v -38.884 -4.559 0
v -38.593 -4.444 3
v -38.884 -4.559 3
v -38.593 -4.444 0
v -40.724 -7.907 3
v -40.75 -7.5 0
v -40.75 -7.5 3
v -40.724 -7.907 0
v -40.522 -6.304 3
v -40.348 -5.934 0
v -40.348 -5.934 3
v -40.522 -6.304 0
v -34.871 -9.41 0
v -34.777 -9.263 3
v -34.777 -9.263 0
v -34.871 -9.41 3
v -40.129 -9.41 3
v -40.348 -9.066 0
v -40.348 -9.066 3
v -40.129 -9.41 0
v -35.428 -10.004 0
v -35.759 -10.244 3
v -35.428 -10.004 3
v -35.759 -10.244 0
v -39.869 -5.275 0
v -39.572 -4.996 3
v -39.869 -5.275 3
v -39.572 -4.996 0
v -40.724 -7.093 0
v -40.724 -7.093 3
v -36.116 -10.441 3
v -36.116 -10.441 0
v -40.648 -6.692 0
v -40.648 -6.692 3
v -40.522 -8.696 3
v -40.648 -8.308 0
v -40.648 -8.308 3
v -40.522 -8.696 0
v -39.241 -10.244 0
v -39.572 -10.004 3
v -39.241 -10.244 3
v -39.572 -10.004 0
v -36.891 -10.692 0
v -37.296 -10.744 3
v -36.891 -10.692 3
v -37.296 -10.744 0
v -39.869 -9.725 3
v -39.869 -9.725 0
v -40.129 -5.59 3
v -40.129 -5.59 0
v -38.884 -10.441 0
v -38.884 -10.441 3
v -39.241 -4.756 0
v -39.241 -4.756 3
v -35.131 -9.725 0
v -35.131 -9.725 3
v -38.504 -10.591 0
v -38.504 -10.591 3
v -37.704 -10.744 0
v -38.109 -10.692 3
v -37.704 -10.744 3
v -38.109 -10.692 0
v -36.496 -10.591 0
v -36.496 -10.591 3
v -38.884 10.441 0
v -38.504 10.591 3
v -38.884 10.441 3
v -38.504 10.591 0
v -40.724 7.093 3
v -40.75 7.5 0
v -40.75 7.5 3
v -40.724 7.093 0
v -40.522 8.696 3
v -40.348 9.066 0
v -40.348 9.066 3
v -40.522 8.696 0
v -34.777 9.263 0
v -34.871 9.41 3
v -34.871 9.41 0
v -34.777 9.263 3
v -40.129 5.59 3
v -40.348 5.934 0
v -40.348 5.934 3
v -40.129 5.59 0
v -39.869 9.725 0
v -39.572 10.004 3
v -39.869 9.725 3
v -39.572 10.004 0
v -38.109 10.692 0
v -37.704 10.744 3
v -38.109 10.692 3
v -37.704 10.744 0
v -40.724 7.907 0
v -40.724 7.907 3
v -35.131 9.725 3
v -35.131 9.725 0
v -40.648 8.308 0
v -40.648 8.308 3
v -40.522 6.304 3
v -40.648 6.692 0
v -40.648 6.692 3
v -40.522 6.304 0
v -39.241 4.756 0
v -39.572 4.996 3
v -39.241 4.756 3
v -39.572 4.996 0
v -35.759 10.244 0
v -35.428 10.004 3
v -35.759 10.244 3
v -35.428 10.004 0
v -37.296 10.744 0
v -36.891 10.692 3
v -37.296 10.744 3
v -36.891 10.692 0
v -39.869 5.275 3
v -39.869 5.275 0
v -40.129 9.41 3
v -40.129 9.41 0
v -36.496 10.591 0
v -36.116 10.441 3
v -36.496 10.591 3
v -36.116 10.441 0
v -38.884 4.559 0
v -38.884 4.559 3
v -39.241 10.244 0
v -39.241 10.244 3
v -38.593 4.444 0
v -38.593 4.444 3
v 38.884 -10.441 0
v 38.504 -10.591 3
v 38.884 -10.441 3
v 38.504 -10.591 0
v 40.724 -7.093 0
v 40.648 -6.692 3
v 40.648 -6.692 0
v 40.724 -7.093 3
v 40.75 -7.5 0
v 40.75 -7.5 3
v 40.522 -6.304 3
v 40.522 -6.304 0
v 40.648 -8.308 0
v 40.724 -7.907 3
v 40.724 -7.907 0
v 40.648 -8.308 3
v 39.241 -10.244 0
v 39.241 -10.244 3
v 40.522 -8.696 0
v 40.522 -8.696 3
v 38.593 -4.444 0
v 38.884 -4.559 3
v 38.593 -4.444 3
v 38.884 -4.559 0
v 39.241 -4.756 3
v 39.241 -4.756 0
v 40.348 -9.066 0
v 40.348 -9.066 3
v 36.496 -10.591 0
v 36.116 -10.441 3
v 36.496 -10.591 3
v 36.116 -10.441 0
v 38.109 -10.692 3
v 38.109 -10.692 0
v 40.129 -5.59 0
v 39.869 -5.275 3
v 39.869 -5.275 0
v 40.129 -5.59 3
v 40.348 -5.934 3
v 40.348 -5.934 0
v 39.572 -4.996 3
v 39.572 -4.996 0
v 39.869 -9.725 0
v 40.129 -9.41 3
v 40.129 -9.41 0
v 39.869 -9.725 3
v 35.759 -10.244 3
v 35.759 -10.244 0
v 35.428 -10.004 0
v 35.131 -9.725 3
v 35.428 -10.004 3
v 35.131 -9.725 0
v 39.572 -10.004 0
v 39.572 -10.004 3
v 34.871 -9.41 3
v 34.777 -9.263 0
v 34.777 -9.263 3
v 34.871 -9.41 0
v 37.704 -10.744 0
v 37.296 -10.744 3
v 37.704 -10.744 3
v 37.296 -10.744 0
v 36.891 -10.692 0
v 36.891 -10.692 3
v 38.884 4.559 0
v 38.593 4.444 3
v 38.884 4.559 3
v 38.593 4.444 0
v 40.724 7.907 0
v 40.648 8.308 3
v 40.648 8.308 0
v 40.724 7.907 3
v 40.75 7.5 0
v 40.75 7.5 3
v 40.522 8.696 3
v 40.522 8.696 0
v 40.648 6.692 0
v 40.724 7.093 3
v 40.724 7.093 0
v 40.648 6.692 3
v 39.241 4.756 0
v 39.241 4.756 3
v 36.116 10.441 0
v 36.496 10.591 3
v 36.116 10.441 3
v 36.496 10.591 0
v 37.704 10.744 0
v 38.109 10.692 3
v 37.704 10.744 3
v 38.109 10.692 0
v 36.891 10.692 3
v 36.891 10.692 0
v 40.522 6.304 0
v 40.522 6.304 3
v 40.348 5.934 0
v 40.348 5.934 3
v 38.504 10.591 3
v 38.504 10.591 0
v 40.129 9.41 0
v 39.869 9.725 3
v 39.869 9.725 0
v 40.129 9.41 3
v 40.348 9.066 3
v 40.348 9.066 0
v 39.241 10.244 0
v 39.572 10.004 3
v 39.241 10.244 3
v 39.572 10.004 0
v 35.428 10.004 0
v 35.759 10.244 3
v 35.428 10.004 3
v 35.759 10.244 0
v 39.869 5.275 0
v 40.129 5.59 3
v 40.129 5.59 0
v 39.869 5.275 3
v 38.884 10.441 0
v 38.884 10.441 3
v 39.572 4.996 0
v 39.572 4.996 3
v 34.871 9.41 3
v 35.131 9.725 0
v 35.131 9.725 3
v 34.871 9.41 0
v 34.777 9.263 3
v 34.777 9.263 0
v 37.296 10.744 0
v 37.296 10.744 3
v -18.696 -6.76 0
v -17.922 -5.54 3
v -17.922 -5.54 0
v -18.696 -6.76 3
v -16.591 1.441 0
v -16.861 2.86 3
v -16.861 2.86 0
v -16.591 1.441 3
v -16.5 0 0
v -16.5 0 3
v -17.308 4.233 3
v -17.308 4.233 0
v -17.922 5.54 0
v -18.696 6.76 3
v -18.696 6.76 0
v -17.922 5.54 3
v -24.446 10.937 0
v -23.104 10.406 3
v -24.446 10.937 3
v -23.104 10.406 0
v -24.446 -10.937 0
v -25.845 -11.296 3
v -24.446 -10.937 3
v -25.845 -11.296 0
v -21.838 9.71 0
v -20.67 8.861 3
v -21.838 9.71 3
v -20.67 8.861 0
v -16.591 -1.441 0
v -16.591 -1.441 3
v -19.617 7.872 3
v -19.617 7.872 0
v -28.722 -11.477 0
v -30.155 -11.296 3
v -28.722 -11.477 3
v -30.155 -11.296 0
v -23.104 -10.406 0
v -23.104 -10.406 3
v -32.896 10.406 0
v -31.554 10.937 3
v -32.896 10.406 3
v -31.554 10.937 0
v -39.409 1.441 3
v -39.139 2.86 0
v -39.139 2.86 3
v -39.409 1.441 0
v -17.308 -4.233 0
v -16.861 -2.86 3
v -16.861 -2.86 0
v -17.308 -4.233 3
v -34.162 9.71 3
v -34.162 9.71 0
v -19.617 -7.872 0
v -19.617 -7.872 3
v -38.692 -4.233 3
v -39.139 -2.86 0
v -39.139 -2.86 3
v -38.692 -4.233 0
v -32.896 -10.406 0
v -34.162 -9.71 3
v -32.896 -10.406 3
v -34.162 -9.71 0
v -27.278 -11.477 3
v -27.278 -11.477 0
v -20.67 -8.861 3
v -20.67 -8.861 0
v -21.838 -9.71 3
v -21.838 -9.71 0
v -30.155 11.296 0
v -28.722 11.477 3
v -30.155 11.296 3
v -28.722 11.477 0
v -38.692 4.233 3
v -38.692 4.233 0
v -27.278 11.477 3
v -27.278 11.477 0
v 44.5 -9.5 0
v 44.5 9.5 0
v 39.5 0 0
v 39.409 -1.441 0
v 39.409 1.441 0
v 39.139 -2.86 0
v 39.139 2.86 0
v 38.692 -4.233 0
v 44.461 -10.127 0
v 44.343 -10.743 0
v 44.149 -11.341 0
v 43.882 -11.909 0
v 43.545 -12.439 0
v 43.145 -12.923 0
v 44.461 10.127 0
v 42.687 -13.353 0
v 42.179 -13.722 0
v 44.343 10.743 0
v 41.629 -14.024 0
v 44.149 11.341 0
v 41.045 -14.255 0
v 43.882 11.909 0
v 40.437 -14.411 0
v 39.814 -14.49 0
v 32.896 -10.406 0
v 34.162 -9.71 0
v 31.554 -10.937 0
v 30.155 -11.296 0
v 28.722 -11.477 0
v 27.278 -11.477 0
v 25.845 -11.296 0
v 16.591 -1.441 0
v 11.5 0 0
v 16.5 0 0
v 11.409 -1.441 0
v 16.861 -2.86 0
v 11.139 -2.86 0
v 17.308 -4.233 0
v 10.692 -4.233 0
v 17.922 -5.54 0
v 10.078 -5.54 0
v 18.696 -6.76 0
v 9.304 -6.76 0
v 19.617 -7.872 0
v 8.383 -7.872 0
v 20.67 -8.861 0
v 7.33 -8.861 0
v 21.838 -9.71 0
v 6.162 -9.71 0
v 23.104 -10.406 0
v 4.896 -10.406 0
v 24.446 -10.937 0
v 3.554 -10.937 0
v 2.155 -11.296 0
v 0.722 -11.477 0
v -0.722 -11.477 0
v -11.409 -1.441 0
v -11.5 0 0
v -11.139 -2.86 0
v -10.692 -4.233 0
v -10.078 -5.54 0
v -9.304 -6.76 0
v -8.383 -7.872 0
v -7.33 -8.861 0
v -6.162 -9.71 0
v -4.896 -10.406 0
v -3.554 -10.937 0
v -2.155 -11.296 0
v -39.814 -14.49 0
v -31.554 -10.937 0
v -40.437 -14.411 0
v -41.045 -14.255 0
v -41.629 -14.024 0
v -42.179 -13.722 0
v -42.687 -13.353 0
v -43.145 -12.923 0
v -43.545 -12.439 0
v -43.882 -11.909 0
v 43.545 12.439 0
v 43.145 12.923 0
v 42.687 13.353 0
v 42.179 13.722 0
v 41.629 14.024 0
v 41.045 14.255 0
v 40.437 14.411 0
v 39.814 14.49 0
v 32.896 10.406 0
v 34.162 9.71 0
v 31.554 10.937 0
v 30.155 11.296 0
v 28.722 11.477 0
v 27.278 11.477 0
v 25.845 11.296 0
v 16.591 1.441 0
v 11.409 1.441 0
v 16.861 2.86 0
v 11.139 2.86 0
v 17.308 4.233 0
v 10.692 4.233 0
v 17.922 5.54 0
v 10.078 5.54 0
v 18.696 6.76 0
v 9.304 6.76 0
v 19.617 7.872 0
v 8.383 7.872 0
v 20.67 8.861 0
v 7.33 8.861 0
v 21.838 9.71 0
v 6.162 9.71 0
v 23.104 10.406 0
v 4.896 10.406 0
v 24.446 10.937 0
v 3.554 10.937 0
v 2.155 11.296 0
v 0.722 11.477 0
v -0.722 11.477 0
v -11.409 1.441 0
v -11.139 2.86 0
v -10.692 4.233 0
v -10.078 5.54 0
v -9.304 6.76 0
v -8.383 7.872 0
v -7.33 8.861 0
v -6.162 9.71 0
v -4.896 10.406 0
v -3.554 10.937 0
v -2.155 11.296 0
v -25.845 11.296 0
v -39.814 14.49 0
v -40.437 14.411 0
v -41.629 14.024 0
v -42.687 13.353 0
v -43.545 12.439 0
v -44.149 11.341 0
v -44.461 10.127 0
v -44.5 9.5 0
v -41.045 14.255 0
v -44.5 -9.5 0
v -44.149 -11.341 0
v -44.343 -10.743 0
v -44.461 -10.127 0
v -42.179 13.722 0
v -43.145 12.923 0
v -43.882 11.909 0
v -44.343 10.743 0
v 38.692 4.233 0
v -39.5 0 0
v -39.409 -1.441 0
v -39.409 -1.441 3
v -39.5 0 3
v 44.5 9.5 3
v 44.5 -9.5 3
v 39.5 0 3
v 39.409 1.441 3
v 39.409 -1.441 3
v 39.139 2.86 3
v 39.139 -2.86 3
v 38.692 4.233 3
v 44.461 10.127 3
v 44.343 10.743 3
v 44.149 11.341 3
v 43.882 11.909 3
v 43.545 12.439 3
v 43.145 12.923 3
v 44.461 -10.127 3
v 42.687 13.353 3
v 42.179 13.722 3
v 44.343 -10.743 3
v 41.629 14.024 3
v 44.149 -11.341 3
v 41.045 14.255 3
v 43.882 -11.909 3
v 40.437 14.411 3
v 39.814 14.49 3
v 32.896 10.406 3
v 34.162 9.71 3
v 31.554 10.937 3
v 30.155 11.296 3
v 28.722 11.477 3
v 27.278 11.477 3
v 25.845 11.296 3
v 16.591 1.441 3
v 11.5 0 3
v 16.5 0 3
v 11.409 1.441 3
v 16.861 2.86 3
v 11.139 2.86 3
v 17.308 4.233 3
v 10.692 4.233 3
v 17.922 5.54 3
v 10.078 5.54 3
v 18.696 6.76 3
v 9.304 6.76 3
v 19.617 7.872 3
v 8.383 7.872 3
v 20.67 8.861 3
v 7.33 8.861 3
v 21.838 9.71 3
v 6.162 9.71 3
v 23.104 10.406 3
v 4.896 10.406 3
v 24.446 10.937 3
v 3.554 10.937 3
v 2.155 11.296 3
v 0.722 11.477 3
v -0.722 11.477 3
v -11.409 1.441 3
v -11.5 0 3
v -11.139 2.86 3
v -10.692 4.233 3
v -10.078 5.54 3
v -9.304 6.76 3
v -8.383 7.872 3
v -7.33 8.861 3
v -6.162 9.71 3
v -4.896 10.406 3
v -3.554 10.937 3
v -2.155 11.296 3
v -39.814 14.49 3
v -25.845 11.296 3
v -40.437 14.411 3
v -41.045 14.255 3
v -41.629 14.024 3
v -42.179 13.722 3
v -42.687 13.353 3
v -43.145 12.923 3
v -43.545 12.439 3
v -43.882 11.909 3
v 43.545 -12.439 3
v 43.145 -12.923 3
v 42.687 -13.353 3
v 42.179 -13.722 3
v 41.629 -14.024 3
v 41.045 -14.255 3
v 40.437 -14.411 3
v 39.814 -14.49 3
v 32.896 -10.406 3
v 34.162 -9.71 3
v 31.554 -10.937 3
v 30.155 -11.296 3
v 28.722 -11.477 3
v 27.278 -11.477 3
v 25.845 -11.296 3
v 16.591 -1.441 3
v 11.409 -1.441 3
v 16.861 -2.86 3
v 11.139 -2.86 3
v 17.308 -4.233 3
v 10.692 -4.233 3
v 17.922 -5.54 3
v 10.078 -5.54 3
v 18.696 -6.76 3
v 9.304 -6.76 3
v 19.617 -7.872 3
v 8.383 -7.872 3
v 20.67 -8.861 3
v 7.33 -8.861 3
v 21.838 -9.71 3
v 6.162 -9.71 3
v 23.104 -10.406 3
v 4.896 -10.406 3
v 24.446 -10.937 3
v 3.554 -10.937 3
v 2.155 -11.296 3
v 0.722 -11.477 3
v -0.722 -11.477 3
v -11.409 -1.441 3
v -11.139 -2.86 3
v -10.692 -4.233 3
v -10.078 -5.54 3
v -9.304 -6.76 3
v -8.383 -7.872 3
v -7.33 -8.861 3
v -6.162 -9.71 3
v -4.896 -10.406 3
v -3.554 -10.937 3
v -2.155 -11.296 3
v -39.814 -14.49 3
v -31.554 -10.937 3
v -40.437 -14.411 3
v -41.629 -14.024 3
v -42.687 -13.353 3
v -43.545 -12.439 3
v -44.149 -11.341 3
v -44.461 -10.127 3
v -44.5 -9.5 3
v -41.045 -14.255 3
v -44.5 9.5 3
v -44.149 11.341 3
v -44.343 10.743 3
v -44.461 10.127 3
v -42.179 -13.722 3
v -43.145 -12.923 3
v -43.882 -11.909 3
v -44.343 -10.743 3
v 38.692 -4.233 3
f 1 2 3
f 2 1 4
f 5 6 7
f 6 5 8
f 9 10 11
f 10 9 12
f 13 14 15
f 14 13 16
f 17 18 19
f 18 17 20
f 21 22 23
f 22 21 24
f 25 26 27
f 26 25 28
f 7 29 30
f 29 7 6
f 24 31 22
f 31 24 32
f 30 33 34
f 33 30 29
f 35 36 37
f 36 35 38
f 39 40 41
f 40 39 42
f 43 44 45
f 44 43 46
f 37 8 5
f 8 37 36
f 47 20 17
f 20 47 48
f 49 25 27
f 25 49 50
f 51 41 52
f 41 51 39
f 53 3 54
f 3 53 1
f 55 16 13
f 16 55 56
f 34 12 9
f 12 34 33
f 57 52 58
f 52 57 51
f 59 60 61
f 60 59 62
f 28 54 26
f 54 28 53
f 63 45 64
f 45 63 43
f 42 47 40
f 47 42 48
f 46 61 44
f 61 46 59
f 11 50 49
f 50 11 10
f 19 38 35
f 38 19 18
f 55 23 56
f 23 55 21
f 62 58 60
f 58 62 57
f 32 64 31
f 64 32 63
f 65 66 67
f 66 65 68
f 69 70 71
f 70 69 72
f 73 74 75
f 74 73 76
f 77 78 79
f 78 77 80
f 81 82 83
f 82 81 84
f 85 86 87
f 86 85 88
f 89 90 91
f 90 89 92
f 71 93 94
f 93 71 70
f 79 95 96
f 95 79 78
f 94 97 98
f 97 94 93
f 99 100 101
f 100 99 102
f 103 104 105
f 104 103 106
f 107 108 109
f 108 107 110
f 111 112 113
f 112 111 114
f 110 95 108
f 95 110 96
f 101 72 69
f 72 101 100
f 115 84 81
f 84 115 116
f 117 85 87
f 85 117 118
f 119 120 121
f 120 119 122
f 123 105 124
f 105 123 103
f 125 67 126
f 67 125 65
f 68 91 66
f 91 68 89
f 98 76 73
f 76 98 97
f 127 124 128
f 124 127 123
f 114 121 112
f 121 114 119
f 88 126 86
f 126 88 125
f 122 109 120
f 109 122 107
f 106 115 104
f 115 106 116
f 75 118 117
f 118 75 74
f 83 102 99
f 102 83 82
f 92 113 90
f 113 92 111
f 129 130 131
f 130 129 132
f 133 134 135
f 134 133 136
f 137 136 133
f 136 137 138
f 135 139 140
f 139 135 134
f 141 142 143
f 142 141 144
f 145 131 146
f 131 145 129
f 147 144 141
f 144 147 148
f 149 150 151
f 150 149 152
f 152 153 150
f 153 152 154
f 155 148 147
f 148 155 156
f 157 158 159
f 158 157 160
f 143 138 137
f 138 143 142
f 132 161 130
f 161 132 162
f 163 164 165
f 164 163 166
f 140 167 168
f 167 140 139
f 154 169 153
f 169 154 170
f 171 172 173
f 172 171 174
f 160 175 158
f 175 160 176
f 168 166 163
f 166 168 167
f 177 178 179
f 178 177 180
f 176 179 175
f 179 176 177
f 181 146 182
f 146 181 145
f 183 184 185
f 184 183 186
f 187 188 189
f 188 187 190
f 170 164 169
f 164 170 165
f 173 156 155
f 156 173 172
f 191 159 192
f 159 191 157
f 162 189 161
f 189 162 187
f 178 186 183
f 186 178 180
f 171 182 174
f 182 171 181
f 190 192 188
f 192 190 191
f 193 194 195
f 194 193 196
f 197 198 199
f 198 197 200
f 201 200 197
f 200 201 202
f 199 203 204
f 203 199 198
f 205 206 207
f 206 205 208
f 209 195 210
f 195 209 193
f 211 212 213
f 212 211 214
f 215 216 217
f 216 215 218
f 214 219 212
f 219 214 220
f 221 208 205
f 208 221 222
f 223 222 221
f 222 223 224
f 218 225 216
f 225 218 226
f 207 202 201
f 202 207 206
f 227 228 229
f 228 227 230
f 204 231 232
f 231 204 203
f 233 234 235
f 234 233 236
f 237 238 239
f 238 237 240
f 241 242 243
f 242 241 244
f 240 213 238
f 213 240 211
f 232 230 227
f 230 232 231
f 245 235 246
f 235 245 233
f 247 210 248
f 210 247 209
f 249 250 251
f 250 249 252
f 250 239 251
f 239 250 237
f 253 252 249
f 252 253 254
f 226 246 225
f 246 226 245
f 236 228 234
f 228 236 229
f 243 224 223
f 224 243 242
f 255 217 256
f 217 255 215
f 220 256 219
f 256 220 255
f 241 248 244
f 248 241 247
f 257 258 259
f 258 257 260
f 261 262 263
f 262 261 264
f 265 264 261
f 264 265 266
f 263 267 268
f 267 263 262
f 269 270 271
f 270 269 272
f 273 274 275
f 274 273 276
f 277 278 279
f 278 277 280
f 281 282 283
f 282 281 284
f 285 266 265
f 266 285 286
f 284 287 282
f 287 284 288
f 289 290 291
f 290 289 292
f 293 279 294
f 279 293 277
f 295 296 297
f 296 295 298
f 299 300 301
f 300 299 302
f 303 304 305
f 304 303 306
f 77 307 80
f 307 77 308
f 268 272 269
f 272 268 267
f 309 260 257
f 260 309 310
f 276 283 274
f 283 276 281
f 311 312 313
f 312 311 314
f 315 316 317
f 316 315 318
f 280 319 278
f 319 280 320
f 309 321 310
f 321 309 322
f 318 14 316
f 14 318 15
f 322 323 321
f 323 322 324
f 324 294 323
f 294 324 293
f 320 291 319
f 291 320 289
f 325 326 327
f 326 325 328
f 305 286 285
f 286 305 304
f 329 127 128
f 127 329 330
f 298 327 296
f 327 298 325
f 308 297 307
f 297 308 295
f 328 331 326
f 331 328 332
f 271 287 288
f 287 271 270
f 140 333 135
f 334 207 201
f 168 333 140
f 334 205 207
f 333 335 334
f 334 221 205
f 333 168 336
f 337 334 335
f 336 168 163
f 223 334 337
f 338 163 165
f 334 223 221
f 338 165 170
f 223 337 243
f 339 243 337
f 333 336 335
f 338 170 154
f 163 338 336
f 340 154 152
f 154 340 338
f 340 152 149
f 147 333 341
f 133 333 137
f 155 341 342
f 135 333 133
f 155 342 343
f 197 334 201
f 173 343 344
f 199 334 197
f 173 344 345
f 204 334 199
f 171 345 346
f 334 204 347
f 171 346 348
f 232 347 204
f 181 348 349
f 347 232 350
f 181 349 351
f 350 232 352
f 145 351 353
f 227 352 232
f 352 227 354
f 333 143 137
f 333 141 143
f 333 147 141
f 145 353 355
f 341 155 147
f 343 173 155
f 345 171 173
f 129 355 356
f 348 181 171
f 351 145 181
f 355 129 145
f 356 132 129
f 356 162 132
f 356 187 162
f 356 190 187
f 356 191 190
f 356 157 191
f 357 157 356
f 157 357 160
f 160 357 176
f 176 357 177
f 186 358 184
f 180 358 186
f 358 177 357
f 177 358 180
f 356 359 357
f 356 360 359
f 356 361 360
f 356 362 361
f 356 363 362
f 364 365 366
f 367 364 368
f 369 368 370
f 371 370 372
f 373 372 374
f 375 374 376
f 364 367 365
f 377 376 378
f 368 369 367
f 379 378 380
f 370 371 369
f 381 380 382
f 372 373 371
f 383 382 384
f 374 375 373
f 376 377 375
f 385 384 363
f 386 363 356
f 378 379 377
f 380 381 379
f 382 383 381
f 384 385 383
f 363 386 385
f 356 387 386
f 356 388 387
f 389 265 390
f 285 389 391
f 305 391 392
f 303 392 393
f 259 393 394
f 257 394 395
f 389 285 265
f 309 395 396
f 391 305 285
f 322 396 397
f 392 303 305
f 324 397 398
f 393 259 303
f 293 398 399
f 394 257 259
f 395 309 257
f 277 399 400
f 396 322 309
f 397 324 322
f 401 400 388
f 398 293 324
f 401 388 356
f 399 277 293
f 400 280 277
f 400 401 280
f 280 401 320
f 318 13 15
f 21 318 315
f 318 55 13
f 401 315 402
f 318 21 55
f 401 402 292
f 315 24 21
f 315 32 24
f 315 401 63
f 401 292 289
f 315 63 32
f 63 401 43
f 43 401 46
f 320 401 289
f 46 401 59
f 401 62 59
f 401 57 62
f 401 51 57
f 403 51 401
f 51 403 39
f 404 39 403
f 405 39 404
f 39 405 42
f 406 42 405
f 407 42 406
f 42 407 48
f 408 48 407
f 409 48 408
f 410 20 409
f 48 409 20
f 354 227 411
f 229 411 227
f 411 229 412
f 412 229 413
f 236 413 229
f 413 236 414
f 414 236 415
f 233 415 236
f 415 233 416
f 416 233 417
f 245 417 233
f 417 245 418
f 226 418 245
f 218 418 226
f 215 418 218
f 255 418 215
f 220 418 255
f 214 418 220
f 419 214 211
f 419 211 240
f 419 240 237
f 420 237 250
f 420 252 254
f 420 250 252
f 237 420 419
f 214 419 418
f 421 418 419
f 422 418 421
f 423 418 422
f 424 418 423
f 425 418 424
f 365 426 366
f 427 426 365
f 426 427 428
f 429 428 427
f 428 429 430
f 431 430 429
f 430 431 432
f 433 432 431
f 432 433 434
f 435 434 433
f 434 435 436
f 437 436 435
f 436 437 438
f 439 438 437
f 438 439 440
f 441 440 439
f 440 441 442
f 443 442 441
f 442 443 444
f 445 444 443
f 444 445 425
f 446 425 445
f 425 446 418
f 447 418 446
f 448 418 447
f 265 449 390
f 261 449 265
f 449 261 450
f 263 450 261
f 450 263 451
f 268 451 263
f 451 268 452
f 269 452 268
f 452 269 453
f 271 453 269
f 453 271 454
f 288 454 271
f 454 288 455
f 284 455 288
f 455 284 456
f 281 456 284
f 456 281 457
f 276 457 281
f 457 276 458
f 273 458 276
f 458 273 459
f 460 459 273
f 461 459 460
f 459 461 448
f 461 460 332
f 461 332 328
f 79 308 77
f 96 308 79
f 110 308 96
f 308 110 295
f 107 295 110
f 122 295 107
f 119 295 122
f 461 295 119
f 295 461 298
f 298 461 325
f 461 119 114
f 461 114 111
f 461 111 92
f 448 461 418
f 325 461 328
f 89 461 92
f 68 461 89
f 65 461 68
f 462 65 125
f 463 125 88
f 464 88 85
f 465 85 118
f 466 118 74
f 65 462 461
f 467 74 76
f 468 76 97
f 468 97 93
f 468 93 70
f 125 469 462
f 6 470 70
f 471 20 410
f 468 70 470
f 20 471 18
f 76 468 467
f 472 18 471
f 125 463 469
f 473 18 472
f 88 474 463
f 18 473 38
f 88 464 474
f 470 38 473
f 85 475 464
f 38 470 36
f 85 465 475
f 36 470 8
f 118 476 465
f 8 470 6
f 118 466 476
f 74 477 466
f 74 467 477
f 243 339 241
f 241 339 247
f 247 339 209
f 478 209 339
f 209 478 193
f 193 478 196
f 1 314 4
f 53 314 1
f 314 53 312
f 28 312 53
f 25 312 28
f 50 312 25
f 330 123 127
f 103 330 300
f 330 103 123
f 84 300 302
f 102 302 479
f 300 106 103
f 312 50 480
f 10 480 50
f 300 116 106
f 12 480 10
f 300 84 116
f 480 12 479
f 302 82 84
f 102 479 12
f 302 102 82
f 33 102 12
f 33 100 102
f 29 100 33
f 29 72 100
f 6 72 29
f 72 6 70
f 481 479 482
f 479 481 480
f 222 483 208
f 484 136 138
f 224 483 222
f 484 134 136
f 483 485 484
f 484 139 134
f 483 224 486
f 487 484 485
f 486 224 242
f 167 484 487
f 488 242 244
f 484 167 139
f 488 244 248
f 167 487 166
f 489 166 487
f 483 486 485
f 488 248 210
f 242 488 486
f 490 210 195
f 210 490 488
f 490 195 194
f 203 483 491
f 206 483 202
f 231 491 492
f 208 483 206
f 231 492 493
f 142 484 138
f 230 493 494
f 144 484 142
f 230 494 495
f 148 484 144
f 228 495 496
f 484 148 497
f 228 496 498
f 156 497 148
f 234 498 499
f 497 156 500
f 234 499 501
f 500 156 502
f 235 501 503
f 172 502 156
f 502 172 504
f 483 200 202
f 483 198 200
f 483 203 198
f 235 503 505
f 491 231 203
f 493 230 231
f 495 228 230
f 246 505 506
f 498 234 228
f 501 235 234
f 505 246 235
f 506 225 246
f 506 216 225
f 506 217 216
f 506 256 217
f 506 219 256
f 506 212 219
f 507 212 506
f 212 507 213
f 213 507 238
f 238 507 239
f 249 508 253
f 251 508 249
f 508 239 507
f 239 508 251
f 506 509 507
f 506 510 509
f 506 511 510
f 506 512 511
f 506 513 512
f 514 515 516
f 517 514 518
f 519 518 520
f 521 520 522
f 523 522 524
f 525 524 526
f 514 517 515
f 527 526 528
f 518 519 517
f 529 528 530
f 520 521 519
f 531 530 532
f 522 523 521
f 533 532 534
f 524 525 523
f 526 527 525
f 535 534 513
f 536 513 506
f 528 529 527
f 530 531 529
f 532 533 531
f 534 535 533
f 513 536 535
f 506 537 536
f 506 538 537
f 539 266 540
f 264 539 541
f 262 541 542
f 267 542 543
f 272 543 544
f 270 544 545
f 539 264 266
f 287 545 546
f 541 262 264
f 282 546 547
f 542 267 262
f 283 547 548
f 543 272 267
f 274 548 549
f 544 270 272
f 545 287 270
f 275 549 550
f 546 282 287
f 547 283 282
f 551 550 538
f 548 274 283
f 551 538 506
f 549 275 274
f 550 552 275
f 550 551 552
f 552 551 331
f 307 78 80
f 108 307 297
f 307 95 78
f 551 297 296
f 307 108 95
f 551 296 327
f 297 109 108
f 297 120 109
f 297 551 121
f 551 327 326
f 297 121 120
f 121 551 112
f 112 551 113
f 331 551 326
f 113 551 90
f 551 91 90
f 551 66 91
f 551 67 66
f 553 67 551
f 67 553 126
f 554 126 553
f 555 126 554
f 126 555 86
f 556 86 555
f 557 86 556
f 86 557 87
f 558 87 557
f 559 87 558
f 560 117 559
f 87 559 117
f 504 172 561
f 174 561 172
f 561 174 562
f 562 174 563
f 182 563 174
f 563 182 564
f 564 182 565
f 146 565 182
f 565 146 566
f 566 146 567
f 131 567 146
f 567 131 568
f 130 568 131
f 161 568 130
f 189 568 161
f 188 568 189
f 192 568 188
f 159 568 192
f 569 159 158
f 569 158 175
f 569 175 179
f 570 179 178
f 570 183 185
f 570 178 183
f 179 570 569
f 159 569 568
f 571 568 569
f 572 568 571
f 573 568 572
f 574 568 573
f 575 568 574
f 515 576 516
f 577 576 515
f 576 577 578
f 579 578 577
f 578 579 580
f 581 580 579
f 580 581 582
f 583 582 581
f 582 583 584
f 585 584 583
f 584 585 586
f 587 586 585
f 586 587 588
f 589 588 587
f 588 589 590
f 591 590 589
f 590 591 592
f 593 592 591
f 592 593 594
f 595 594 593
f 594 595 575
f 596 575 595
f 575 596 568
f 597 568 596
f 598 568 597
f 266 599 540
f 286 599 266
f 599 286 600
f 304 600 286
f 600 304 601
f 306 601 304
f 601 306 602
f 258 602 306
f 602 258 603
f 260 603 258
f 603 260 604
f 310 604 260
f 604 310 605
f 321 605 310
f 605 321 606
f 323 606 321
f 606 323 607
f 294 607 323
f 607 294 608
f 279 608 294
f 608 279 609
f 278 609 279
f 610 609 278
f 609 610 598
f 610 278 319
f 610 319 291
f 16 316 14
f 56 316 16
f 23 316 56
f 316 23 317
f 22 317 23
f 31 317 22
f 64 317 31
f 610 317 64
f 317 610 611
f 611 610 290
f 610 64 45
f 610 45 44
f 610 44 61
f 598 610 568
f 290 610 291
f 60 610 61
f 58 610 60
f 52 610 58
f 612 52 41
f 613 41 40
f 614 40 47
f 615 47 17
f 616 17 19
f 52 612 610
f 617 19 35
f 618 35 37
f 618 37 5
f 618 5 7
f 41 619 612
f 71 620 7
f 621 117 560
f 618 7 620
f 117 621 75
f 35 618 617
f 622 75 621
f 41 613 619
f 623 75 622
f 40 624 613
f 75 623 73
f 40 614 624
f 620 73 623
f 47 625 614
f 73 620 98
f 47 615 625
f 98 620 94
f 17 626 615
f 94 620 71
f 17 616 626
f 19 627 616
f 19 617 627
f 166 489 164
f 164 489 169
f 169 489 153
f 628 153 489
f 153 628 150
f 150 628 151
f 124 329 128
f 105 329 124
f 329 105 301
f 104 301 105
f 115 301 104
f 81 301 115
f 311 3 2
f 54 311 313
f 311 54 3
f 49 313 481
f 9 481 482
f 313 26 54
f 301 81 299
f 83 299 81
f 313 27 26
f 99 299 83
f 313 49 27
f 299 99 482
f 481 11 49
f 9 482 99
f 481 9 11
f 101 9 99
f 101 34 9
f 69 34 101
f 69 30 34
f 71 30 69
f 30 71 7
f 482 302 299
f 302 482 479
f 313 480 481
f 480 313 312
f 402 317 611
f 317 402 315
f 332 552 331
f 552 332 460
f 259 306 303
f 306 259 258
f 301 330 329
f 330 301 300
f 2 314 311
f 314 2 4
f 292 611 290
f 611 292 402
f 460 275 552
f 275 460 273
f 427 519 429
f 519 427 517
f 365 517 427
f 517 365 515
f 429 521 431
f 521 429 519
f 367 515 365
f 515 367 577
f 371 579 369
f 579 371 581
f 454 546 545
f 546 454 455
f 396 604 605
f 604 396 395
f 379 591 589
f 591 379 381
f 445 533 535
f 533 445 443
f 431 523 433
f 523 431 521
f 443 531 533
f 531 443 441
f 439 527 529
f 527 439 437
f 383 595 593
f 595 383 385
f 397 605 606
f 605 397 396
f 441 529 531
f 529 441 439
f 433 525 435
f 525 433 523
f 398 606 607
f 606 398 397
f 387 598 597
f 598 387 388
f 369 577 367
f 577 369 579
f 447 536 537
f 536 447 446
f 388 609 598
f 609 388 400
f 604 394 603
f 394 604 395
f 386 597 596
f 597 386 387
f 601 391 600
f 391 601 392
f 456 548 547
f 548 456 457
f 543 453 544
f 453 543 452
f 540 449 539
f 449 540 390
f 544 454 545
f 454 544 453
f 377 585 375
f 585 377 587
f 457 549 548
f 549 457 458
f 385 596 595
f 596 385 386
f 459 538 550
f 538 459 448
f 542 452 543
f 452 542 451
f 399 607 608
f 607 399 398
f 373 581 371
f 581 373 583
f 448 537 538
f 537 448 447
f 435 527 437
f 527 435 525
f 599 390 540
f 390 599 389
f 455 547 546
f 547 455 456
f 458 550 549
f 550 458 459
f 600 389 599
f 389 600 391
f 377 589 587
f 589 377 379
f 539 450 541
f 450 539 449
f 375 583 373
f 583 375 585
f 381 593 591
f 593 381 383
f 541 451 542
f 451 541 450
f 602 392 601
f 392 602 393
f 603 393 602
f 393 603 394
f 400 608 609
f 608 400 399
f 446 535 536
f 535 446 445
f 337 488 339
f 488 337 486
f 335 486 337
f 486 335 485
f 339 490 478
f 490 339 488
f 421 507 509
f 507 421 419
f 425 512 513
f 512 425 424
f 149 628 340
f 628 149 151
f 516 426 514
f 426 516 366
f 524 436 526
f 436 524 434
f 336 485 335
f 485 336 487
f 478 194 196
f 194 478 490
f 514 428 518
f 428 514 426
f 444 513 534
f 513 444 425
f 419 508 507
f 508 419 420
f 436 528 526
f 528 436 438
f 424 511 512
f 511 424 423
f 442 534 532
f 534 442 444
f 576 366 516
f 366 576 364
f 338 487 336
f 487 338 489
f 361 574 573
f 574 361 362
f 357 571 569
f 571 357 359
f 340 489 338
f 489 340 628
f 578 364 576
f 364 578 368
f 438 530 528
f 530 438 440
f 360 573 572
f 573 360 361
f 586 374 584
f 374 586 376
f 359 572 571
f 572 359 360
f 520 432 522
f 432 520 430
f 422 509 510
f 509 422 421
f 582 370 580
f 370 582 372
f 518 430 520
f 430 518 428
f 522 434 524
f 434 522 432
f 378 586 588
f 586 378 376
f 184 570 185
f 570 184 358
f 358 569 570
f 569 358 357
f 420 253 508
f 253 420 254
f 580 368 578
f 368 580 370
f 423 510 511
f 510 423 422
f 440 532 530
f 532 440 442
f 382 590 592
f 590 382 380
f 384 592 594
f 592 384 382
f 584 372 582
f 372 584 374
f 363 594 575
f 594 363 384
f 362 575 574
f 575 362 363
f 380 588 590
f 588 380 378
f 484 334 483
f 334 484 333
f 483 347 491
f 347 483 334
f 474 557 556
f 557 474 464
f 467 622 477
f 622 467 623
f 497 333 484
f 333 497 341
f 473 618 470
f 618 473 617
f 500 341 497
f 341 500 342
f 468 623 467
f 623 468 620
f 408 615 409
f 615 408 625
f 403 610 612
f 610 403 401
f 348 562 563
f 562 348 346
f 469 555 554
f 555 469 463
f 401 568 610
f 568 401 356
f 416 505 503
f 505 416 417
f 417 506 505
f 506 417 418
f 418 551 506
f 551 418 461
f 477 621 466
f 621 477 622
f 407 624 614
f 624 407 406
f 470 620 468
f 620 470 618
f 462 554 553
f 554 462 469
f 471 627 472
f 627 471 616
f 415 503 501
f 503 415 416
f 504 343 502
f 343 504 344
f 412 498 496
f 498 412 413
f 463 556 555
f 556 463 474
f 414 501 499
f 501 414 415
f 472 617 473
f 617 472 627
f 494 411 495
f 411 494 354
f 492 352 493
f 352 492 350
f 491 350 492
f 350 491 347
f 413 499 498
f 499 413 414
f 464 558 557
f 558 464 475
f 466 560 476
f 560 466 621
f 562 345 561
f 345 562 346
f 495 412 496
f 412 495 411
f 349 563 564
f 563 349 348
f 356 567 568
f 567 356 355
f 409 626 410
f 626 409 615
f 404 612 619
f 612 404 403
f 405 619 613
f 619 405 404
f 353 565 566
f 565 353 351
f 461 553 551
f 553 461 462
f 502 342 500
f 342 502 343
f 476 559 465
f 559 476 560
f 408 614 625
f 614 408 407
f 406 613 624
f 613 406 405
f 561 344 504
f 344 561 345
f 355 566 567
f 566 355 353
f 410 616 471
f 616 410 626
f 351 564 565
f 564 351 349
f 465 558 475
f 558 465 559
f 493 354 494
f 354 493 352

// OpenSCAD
$fn = 50;


difference() {
	union() {
		hull() {
			translate(v = [-39.5000000000, 9.5000000000, 0]) {
				cylinder(h = 3, r = 5);
			}
			translate(v = [39.5000000000, 9.5000000000, 0]) {
				cylinder(h = 3, r = 5);
			}
			translate(v = [-39.5000000000, -9.5000000000, 0]) {
				cylinder(h = 3, r = 5);
			}
			translate(v = [39.5000000000, -9.5000000000, 0]) {
				cylinder(h = 3, r = 5);
			}
		}
	}
	union() {
		#translate(v = [-37.5000000000, -7.5000000000, -100.0000000000]) {
			cylinder(h = 200, r = 3.2500000000);
		}
		#translate(v = [-37.5000000000, 7.5000000000, -100.0000000000]) {
			cylinder(h = 200, r = 3.2500000000);
		}
		#translate(v = [37.5000000000, -7.5000000000, -100.0000000000]) {
			cylinder(h = 200, r = 3.2500000000);
		}
		#translate(v = [37.5000000000, 7.5000000000, -100.0000000000]) {
			cylinder(h = 200, r = 3.2500000000);
		}
		#translate(v = [-28.0000000000, 0, 0]) {
			cylinder(h = 3, r = 11.5000000000);
		}
		#cylinder(h = 3, r = 11.5000000000);
		#translate(v = [28.0000000000, 0, 0]) {
			cylinder(h = 3, r = 11.5000000000);
		}
	}
}
